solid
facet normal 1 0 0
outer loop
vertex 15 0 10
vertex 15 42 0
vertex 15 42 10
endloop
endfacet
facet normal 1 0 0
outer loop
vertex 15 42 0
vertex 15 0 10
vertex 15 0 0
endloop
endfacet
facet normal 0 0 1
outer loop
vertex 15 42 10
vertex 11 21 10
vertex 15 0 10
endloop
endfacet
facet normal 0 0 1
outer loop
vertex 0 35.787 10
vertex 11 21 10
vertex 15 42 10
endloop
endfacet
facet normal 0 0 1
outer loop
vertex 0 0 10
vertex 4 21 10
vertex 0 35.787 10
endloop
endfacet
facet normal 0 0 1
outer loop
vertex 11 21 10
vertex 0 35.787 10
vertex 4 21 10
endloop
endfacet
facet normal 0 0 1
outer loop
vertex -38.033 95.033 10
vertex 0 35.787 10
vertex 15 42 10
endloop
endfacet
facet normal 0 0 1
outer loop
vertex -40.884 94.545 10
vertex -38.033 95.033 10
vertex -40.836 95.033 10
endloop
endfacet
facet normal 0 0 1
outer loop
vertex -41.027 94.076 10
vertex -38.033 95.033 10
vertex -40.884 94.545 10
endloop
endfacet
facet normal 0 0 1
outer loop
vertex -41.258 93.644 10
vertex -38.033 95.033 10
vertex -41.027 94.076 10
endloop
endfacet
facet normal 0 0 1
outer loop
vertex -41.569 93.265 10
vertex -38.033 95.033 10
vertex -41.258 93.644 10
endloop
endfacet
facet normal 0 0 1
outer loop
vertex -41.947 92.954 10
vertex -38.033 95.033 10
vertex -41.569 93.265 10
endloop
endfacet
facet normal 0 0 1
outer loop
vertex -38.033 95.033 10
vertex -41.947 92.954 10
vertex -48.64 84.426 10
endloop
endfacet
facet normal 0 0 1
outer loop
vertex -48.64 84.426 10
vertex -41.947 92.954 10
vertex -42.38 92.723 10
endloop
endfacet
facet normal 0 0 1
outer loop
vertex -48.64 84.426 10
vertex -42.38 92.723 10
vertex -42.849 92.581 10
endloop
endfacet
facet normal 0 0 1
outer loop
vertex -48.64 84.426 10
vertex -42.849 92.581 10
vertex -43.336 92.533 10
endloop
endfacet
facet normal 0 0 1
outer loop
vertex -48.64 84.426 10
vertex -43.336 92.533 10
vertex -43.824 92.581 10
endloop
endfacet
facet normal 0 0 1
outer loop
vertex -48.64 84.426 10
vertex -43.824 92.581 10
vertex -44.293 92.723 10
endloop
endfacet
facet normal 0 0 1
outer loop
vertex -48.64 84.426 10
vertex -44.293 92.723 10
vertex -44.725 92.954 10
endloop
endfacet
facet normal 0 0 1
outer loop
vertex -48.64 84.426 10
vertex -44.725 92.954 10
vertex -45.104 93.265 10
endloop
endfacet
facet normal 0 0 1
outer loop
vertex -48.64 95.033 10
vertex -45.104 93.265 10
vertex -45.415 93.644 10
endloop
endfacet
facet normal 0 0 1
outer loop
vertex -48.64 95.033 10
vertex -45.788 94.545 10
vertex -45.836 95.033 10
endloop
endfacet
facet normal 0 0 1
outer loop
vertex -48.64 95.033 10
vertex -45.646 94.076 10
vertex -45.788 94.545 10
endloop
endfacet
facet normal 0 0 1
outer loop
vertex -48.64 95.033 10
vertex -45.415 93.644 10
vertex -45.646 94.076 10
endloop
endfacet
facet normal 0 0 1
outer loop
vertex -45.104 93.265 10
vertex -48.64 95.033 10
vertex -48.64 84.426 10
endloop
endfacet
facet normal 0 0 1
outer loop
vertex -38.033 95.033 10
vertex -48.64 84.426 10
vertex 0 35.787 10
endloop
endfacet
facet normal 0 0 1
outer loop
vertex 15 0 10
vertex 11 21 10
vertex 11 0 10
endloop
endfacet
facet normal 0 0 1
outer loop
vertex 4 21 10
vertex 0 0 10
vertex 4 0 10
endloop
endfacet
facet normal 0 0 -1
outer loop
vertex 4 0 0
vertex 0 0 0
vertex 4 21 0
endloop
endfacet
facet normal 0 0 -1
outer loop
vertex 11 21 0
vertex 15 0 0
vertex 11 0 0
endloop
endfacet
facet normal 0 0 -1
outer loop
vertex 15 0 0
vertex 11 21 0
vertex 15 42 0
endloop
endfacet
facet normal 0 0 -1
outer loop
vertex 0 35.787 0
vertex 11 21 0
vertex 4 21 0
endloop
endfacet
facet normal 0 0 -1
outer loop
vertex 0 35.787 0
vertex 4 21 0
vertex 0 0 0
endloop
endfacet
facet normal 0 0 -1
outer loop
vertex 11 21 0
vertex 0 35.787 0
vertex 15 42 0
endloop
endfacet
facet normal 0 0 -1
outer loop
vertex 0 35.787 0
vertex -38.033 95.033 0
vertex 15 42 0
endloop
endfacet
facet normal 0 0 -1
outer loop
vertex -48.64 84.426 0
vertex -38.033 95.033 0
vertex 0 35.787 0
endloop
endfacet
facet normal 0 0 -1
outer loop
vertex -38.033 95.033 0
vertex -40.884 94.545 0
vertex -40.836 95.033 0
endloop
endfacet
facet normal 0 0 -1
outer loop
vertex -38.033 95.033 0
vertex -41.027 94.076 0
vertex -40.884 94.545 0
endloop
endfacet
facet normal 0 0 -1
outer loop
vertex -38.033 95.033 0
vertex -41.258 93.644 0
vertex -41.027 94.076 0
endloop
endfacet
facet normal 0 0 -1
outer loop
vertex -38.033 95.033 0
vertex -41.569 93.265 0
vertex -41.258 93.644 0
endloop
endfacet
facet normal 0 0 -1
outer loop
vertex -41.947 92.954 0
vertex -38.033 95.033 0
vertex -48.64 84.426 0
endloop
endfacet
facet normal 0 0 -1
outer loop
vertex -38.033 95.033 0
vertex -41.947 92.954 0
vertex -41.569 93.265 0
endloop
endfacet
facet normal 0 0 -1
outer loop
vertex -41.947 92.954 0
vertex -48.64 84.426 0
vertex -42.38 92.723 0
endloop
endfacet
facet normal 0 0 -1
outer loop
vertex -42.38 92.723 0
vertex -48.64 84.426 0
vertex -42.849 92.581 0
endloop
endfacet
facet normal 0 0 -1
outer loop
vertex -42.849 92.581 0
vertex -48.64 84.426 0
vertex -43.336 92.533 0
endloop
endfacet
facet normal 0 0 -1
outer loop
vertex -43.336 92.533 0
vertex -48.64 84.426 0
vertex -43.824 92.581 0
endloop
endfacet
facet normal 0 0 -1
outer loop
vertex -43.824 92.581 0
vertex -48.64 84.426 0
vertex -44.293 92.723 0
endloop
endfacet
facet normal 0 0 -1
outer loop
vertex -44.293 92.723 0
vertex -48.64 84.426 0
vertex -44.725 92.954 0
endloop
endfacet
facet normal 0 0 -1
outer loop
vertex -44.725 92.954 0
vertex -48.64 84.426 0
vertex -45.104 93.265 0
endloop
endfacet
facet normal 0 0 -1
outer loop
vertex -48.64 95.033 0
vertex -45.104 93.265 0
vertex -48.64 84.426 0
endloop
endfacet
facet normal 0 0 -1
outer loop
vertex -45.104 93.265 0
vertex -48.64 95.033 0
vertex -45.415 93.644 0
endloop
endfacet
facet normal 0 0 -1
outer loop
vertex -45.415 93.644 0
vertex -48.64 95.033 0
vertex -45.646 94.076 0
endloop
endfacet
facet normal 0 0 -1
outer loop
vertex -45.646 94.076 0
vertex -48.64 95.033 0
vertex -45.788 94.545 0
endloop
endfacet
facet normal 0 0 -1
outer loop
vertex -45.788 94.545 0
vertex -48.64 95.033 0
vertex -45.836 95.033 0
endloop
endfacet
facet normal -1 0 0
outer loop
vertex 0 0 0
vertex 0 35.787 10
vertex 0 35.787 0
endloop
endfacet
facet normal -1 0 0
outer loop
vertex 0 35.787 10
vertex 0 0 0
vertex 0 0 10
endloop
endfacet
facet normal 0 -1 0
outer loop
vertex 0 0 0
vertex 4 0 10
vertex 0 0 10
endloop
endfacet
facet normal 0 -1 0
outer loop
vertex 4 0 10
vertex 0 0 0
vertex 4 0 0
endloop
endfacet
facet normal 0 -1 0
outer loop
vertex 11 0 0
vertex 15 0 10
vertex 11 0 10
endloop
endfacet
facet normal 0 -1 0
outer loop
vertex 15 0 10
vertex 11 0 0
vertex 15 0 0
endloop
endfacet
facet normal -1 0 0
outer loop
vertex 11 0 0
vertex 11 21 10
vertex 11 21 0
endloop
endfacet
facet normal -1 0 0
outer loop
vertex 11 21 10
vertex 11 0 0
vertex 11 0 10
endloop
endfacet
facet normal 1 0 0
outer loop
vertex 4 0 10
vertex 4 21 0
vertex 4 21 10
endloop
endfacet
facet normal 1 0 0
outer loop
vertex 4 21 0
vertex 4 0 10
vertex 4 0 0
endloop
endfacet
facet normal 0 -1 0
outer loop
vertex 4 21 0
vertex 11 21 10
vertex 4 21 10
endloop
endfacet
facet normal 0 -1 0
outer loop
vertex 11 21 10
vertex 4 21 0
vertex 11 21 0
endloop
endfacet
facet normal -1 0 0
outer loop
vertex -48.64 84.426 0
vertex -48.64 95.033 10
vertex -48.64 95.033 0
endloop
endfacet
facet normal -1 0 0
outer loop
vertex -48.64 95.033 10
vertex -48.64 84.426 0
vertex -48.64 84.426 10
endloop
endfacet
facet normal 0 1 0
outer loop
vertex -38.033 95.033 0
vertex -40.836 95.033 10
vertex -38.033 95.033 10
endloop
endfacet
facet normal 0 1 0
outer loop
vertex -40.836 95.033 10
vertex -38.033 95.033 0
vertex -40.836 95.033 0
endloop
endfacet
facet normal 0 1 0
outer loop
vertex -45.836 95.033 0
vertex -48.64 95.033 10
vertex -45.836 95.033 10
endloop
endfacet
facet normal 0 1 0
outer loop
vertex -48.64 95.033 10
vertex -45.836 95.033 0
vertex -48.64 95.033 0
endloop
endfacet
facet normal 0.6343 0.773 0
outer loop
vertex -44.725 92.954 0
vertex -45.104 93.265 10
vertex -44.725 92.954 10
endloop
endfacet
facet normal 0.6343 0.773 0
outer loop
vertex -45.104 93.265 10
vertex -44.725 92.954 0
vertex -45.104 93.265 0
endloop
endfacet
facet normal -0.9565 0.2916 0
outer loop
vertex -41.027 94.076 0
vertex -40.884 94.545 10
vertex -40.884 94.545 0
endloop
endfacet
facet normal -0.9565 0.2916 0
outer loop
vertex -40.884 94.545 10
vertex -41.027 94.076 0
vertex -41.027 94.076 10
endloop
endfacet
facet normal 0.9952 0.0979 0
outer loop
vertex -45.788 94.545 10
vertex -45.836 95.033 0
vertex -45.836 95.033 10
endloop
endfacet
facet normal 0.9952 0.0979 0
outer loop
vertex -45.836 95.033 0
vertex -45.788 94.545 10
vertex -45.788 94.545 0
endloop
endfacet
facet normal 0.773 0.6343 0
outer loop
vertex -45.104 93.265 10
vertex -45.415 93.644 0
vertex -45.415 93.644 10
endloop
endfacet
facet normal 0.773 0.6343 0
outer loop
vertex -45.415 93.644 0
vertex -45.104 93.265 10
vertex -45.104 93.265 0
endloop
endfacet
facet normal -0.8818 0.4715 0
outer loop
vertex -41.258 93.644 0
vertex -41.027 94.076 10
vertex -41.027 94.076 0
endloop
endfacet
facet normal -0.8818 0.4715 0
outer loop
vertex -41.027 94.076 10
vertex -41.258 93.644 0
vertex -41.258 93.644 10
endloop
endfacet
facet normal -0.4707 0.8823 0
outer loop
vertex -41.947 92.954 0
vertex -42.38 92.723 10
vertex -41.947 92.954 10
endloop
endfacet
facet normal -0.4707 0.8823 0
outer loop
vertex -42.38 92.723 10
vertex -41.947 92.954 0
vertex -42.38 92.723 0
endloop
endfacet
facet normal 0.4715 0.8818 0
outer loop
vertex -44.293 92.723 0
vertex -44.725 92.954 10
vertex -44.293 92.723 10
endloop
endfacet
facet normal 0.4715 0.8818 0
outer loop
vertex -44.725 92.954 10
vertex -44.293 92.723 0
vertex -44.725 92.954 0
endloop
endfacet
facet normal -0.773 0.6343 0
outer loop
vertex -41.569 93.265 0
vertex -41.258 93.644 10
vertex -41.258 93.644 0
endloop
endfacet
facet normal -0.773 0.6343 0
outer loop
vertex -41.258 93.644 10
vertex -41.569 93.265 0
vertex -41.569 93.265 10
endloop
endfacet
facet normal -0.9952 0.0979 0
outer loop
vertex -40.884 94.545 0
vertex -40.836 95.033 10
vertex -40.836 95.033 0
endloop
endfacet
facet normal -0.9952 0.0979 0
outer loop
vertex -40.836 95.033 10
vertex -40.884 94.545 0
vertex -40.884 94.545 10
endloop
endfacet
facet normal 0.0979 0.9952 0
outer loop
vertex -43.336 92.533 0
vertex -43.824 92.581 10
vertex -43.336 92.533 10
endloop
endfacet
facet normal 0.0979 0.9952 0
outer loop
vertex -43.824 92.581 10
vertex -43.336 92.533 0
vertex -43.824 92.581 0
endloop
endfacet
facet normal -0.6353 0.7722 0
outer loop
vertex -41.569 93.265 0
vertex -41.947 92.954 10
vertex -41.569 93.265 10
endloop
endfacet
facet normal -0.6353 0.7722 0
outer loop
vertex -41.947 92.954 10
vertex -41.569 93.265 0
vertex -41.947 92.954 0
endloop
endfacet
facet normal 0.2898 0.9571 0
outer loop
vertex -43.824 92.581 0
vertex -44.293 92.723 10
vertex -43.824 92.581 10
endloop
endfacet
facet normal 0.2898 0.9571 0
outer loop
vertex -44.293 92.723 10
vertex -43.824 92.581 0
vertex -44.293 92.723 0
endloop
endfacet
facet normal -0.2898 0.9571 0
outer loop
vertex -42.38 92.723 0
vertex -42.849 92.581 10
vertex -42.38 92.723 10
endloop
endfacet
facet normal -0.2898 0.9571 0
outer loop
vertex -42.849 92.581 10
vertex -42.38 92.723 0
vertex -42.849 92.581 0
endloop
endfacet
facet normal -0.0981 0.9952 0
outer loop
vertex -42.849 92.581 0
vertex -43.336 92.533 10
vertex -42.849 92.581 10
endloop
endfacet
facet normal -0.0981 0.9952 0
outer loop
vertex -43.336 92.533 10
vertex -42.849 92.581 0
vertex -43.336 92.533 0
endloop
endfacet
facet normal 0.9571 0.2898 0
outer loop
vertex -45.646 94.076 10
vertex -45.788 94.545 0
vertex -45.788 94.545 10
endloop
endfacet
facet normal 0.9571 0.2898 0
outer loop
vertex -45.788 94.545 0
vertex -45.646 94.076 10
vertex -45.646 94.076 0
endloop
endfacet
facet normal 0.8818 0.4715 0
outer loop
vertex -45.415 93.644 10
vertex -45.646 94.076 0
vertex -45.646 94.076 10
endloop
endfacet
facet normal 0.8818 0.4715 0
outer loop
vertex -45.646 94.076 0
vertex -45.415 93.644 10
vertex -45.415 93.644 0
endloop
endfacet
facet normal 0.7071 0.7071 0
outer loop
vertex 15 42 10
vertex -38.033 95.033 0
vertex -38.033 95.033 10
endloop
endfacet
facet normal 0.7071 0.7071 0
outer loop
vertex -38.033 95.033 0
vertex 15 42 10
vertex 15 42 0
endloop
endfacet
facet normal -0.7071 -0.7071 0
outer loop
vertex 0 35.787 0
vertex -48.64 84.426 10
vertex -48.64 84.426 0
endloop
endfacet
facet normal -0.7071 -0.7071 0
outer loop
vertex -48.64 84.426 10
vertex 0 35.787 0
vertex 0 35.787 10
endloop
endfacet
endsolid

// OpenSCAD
$fn = 31+1;

// Customizable spool holder

// preview[view:south, tilt:top]

// thickness of your frame (in mm)
thickness = 7;
depth = thickness + 8;
center = depth/2;

// width of the holder (in mm)
width = 10;

// lenth of the holder clip (in mm)
frame = 21;

// diameter of your spool (in mm)
diameter = 150;
spool = diameter/2;
rectangle = frame*2;

// size of the rod that hold your spool (in mm)
rod = 5;
x = depth-cos(45)*depth;

rotate (0, 0, 0){
    difference () {
        cube ([depth, rectangle, width]);
        translate([center-thickness/2,-1,-0.5]){
            cube ([thickness, frame+1, width+1]);
        }}
    translate ([depth, rectangle, 0]){
        rotate ([0, 0, 135]){
            cube ([spool, depth, width]);
            }
        }
    difference (){
        translate ([-cos(45)*spool+x, rectangle-cos(45)*depth+cos(45)*spool, 0]){
            cube ([cos(45)*depth, cos(45)*depth, width]);
        }
        translate ([-cos(45)*spool+x+cos(45)*depth/2, rectangle-cos(45)*depth+cos(45)*spool+cos(45)*depth, -0.5]){
            cylinder (width+1, d = rod);
        }
        }}
